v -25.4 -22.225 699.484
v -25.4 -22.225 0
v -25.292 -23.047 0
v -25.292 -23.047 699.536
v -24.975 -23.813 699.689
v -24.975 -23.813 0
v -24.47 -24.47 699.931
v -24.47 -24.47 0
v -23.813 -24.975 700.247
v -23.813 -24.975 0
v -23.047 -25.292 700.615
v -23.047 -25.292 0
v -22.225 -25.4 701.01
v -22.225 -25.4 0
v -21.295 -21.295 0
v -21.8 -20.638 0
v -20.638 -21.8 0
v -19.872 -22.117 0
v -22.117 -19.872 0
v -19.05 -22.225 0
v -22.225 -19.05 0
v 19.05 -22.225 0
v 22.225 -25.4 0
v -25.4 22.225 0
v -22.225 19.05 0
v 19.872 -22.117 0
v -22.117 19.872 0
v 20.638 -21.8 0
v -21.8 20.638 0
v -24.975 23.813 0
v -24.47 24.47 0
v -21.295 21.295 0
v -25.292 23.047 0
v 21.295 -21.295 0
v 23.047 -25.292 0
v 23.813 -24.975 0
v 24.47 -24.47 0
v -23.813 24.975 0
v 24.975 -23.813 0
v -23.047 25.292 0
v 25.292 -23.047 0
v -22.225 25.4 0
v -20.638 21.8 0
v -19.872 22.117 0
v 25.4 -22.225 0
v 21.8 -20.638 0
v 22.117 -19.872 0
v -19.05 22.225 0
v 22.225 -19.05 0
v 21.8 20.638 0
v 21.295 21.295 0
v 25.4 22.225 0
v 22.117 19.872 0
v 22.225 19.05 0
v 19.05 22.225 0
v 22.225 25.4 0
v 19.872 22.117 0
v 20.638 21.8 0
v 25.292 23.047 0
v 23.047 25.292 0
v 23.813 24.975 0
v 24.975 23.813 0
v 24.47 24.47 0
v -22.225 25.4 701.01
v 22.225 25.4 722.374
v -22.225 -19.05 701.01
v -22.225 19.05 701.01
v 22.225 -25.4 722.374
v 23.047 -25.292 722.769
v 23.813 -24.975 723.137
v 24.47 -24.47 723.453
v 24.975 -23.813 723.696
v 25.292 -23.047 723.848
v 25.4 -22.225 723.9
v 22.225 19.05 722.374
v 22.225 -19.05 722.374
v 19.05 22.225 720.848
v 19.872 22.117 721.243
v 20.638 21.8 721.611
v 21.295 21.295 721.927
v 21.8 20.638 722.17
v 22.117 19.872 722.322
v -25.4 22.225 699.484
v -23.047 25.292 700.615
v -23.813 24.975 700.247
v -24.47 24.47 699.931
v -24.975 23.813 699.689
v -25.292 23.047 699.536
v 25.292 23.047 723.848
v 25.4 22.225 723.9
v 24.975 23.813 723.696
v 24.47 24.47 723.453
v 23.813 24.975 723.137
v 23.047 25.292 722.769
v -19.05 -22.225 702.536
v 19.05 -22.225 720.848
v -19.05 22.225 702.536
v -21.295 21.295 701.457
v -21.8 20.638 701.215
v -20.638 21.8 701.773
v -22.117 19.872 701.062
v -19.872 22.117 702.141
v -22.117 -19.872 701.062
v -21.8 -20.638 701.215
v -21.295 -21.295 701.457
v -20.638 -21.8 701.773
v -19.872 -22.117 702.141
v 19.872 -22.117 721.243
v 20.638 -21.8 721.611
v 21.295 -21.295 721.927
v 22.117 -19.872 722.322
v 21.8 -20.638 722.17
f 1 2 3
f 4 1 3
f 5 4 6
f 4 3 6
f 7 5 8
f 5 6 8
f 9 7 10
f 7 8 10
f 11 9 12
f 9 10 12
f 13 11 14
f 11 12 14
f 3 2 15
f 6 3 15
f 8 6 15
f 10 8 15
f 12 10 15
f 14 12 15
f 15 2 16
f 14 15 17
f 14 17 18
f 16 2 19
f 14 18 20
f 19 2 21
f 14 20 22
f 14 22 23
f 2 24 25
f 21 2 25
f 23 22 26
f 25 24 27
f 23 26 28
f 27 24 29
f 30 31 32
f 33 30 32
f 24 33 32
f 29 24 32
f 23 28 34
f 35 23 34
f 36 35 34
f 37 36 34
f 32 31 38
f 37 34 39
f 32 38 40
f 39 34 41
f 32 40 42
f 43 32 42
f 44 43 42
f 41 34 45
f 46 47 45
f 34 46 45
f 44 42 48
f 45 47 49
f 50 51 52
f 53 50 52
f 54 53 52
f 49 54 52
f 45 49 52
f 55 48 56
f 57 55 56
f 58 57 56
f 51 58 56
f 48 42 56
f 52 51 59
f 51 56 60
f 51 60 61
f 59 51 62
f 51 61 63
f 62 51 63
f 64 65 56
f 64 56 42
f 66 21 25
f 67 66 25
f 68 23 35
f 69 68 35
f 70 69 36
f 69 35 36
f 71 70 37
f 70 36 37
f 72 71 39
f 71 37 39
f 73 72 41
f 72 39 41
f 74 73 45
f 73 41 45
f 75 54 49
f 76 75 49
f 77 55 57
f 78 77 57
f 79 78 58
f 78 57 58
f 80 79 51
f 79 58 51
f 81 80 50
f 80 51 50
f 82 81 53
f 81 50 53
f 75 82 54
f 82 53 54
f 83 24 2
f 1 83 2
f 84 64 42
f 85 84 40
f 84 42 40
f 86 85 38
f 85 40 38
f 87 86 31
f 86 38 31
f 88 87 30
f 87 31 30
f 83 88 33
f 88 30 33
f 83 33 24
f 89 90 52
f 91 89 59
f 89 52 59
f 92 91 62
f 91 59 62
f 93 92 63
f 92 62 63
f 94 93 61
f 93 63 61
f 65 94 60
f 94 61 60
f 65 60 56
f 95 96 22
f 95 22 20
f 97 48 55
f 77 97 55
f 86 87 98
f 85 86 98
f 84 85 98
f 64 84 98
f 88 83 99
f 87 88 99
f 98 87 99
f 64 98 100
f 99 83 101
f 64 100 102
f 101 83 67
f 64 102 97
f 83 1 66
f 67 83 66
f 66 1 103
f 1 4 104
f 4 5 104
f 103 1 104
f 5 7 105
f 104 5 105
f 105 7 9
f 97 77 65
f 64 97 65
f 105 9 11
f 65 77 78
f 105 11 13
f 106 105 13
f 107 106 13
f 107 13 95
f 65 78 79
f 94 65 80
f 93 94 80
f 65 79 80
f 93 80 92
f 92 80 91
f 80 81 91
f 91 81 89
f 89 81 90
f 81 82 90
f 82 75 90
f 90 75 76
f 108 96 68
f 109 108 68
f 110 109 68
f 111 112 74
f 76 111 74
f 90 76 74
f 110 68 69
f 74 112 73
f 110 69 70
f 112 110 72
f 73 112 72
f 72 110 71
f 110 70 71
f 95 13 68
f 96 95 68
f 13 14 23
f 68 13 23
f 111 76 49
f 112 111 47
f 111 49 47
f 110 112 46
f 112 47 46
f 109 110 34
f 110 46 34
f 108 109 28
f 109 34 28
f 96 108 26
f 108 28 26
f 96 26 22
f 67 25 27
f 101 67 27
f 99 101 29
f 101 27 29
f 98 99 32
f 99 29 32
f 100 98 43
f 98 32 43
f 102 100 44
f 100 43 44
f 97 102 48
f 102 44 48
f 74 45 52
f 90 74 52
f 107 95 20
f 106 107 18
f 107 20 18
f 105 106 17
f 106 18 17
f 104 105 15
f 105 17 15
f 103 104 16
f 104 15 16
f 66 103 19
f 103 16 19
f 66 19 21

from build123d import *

# Parameters (mm, degrees)
F1_DEPTH      = 723.9
F3_DEPTH      = 50.8
F3_DEPTH_BACK = 50.8


with BuildPart() as f1:
    # F0 (on Top) → F1 (new body)
    with BuildSketch(Plane.XY):
        with BuildLine():
            ThreePointArc((25.4, 22.225), (24.4700640303, 24.4700640303), (22.225, 25.4))
            Line((22.225, 25.4), (-22.225, 25.4))
            ThreePointArc((-22.225, 25.4), (-24.4700640303, 24.4700640303), (-25.4, 22.225))
            Line((-25.4, 22.225), (-25.4, -22.225))
            ThreePointArc((-25.4, -22.225), (-24.4700640303, -24.4700640303), (-22.225, -25.4))
            Line((-22.225, -25.4), (22.225, -25.4))
            ThreePointArc((22.225, -25.4), (24.4700640303, -24.4700640303), (25.4, -22.225))
            Line((25.4, -22.225), (25.4, 22.225))
        make_face()
        with BuildLine():
            Line((-19.05, 22.225), (19.05, 22.225))
            ThreePointArc((19.05, 22.225), (21.2950640303, 21.2950640303), (22.225, 19.05))
            Line((22.225, 19.05), (22.225, -19.05))
            ThreePointArc((22.225, -19.05), (21.2950640303, -21.2950640303), (19.05, -22.225))
            Line((19.05, -22.225), (-19.05, -22.225))
            ThreePointArc((-19.05, -22.225), (-21.2950640303, -21.2950640303), (-22.225, -19.05))
            Line((-22.225, -19.05), (-22.225, 19.05))
            ThreePointArc((-22.225, 19.05), (-21.2950640303, 21.2950640303), (-19.05, 22.225))
        make_face(mode=Mode.SUBTRACT)
    extrude(amount=F1_DEPTH)

    # F2 (on Front) → F3 (cut, two sides)
    with BuildSketch(Plane.XZ) as f3_sk:
        Polygon((-25.4, 699.484362387), (25.4, 723.9), (-25.4, 723.9), align=None)
    extrude(amount=-F3_DEPTH, mode=Mode.SUBTRACT)
    extrude(f3_sk.sketch, amount=F3_DEPTH_BACK, mode=Mode.SUBTRACT)


solid = f1.part
